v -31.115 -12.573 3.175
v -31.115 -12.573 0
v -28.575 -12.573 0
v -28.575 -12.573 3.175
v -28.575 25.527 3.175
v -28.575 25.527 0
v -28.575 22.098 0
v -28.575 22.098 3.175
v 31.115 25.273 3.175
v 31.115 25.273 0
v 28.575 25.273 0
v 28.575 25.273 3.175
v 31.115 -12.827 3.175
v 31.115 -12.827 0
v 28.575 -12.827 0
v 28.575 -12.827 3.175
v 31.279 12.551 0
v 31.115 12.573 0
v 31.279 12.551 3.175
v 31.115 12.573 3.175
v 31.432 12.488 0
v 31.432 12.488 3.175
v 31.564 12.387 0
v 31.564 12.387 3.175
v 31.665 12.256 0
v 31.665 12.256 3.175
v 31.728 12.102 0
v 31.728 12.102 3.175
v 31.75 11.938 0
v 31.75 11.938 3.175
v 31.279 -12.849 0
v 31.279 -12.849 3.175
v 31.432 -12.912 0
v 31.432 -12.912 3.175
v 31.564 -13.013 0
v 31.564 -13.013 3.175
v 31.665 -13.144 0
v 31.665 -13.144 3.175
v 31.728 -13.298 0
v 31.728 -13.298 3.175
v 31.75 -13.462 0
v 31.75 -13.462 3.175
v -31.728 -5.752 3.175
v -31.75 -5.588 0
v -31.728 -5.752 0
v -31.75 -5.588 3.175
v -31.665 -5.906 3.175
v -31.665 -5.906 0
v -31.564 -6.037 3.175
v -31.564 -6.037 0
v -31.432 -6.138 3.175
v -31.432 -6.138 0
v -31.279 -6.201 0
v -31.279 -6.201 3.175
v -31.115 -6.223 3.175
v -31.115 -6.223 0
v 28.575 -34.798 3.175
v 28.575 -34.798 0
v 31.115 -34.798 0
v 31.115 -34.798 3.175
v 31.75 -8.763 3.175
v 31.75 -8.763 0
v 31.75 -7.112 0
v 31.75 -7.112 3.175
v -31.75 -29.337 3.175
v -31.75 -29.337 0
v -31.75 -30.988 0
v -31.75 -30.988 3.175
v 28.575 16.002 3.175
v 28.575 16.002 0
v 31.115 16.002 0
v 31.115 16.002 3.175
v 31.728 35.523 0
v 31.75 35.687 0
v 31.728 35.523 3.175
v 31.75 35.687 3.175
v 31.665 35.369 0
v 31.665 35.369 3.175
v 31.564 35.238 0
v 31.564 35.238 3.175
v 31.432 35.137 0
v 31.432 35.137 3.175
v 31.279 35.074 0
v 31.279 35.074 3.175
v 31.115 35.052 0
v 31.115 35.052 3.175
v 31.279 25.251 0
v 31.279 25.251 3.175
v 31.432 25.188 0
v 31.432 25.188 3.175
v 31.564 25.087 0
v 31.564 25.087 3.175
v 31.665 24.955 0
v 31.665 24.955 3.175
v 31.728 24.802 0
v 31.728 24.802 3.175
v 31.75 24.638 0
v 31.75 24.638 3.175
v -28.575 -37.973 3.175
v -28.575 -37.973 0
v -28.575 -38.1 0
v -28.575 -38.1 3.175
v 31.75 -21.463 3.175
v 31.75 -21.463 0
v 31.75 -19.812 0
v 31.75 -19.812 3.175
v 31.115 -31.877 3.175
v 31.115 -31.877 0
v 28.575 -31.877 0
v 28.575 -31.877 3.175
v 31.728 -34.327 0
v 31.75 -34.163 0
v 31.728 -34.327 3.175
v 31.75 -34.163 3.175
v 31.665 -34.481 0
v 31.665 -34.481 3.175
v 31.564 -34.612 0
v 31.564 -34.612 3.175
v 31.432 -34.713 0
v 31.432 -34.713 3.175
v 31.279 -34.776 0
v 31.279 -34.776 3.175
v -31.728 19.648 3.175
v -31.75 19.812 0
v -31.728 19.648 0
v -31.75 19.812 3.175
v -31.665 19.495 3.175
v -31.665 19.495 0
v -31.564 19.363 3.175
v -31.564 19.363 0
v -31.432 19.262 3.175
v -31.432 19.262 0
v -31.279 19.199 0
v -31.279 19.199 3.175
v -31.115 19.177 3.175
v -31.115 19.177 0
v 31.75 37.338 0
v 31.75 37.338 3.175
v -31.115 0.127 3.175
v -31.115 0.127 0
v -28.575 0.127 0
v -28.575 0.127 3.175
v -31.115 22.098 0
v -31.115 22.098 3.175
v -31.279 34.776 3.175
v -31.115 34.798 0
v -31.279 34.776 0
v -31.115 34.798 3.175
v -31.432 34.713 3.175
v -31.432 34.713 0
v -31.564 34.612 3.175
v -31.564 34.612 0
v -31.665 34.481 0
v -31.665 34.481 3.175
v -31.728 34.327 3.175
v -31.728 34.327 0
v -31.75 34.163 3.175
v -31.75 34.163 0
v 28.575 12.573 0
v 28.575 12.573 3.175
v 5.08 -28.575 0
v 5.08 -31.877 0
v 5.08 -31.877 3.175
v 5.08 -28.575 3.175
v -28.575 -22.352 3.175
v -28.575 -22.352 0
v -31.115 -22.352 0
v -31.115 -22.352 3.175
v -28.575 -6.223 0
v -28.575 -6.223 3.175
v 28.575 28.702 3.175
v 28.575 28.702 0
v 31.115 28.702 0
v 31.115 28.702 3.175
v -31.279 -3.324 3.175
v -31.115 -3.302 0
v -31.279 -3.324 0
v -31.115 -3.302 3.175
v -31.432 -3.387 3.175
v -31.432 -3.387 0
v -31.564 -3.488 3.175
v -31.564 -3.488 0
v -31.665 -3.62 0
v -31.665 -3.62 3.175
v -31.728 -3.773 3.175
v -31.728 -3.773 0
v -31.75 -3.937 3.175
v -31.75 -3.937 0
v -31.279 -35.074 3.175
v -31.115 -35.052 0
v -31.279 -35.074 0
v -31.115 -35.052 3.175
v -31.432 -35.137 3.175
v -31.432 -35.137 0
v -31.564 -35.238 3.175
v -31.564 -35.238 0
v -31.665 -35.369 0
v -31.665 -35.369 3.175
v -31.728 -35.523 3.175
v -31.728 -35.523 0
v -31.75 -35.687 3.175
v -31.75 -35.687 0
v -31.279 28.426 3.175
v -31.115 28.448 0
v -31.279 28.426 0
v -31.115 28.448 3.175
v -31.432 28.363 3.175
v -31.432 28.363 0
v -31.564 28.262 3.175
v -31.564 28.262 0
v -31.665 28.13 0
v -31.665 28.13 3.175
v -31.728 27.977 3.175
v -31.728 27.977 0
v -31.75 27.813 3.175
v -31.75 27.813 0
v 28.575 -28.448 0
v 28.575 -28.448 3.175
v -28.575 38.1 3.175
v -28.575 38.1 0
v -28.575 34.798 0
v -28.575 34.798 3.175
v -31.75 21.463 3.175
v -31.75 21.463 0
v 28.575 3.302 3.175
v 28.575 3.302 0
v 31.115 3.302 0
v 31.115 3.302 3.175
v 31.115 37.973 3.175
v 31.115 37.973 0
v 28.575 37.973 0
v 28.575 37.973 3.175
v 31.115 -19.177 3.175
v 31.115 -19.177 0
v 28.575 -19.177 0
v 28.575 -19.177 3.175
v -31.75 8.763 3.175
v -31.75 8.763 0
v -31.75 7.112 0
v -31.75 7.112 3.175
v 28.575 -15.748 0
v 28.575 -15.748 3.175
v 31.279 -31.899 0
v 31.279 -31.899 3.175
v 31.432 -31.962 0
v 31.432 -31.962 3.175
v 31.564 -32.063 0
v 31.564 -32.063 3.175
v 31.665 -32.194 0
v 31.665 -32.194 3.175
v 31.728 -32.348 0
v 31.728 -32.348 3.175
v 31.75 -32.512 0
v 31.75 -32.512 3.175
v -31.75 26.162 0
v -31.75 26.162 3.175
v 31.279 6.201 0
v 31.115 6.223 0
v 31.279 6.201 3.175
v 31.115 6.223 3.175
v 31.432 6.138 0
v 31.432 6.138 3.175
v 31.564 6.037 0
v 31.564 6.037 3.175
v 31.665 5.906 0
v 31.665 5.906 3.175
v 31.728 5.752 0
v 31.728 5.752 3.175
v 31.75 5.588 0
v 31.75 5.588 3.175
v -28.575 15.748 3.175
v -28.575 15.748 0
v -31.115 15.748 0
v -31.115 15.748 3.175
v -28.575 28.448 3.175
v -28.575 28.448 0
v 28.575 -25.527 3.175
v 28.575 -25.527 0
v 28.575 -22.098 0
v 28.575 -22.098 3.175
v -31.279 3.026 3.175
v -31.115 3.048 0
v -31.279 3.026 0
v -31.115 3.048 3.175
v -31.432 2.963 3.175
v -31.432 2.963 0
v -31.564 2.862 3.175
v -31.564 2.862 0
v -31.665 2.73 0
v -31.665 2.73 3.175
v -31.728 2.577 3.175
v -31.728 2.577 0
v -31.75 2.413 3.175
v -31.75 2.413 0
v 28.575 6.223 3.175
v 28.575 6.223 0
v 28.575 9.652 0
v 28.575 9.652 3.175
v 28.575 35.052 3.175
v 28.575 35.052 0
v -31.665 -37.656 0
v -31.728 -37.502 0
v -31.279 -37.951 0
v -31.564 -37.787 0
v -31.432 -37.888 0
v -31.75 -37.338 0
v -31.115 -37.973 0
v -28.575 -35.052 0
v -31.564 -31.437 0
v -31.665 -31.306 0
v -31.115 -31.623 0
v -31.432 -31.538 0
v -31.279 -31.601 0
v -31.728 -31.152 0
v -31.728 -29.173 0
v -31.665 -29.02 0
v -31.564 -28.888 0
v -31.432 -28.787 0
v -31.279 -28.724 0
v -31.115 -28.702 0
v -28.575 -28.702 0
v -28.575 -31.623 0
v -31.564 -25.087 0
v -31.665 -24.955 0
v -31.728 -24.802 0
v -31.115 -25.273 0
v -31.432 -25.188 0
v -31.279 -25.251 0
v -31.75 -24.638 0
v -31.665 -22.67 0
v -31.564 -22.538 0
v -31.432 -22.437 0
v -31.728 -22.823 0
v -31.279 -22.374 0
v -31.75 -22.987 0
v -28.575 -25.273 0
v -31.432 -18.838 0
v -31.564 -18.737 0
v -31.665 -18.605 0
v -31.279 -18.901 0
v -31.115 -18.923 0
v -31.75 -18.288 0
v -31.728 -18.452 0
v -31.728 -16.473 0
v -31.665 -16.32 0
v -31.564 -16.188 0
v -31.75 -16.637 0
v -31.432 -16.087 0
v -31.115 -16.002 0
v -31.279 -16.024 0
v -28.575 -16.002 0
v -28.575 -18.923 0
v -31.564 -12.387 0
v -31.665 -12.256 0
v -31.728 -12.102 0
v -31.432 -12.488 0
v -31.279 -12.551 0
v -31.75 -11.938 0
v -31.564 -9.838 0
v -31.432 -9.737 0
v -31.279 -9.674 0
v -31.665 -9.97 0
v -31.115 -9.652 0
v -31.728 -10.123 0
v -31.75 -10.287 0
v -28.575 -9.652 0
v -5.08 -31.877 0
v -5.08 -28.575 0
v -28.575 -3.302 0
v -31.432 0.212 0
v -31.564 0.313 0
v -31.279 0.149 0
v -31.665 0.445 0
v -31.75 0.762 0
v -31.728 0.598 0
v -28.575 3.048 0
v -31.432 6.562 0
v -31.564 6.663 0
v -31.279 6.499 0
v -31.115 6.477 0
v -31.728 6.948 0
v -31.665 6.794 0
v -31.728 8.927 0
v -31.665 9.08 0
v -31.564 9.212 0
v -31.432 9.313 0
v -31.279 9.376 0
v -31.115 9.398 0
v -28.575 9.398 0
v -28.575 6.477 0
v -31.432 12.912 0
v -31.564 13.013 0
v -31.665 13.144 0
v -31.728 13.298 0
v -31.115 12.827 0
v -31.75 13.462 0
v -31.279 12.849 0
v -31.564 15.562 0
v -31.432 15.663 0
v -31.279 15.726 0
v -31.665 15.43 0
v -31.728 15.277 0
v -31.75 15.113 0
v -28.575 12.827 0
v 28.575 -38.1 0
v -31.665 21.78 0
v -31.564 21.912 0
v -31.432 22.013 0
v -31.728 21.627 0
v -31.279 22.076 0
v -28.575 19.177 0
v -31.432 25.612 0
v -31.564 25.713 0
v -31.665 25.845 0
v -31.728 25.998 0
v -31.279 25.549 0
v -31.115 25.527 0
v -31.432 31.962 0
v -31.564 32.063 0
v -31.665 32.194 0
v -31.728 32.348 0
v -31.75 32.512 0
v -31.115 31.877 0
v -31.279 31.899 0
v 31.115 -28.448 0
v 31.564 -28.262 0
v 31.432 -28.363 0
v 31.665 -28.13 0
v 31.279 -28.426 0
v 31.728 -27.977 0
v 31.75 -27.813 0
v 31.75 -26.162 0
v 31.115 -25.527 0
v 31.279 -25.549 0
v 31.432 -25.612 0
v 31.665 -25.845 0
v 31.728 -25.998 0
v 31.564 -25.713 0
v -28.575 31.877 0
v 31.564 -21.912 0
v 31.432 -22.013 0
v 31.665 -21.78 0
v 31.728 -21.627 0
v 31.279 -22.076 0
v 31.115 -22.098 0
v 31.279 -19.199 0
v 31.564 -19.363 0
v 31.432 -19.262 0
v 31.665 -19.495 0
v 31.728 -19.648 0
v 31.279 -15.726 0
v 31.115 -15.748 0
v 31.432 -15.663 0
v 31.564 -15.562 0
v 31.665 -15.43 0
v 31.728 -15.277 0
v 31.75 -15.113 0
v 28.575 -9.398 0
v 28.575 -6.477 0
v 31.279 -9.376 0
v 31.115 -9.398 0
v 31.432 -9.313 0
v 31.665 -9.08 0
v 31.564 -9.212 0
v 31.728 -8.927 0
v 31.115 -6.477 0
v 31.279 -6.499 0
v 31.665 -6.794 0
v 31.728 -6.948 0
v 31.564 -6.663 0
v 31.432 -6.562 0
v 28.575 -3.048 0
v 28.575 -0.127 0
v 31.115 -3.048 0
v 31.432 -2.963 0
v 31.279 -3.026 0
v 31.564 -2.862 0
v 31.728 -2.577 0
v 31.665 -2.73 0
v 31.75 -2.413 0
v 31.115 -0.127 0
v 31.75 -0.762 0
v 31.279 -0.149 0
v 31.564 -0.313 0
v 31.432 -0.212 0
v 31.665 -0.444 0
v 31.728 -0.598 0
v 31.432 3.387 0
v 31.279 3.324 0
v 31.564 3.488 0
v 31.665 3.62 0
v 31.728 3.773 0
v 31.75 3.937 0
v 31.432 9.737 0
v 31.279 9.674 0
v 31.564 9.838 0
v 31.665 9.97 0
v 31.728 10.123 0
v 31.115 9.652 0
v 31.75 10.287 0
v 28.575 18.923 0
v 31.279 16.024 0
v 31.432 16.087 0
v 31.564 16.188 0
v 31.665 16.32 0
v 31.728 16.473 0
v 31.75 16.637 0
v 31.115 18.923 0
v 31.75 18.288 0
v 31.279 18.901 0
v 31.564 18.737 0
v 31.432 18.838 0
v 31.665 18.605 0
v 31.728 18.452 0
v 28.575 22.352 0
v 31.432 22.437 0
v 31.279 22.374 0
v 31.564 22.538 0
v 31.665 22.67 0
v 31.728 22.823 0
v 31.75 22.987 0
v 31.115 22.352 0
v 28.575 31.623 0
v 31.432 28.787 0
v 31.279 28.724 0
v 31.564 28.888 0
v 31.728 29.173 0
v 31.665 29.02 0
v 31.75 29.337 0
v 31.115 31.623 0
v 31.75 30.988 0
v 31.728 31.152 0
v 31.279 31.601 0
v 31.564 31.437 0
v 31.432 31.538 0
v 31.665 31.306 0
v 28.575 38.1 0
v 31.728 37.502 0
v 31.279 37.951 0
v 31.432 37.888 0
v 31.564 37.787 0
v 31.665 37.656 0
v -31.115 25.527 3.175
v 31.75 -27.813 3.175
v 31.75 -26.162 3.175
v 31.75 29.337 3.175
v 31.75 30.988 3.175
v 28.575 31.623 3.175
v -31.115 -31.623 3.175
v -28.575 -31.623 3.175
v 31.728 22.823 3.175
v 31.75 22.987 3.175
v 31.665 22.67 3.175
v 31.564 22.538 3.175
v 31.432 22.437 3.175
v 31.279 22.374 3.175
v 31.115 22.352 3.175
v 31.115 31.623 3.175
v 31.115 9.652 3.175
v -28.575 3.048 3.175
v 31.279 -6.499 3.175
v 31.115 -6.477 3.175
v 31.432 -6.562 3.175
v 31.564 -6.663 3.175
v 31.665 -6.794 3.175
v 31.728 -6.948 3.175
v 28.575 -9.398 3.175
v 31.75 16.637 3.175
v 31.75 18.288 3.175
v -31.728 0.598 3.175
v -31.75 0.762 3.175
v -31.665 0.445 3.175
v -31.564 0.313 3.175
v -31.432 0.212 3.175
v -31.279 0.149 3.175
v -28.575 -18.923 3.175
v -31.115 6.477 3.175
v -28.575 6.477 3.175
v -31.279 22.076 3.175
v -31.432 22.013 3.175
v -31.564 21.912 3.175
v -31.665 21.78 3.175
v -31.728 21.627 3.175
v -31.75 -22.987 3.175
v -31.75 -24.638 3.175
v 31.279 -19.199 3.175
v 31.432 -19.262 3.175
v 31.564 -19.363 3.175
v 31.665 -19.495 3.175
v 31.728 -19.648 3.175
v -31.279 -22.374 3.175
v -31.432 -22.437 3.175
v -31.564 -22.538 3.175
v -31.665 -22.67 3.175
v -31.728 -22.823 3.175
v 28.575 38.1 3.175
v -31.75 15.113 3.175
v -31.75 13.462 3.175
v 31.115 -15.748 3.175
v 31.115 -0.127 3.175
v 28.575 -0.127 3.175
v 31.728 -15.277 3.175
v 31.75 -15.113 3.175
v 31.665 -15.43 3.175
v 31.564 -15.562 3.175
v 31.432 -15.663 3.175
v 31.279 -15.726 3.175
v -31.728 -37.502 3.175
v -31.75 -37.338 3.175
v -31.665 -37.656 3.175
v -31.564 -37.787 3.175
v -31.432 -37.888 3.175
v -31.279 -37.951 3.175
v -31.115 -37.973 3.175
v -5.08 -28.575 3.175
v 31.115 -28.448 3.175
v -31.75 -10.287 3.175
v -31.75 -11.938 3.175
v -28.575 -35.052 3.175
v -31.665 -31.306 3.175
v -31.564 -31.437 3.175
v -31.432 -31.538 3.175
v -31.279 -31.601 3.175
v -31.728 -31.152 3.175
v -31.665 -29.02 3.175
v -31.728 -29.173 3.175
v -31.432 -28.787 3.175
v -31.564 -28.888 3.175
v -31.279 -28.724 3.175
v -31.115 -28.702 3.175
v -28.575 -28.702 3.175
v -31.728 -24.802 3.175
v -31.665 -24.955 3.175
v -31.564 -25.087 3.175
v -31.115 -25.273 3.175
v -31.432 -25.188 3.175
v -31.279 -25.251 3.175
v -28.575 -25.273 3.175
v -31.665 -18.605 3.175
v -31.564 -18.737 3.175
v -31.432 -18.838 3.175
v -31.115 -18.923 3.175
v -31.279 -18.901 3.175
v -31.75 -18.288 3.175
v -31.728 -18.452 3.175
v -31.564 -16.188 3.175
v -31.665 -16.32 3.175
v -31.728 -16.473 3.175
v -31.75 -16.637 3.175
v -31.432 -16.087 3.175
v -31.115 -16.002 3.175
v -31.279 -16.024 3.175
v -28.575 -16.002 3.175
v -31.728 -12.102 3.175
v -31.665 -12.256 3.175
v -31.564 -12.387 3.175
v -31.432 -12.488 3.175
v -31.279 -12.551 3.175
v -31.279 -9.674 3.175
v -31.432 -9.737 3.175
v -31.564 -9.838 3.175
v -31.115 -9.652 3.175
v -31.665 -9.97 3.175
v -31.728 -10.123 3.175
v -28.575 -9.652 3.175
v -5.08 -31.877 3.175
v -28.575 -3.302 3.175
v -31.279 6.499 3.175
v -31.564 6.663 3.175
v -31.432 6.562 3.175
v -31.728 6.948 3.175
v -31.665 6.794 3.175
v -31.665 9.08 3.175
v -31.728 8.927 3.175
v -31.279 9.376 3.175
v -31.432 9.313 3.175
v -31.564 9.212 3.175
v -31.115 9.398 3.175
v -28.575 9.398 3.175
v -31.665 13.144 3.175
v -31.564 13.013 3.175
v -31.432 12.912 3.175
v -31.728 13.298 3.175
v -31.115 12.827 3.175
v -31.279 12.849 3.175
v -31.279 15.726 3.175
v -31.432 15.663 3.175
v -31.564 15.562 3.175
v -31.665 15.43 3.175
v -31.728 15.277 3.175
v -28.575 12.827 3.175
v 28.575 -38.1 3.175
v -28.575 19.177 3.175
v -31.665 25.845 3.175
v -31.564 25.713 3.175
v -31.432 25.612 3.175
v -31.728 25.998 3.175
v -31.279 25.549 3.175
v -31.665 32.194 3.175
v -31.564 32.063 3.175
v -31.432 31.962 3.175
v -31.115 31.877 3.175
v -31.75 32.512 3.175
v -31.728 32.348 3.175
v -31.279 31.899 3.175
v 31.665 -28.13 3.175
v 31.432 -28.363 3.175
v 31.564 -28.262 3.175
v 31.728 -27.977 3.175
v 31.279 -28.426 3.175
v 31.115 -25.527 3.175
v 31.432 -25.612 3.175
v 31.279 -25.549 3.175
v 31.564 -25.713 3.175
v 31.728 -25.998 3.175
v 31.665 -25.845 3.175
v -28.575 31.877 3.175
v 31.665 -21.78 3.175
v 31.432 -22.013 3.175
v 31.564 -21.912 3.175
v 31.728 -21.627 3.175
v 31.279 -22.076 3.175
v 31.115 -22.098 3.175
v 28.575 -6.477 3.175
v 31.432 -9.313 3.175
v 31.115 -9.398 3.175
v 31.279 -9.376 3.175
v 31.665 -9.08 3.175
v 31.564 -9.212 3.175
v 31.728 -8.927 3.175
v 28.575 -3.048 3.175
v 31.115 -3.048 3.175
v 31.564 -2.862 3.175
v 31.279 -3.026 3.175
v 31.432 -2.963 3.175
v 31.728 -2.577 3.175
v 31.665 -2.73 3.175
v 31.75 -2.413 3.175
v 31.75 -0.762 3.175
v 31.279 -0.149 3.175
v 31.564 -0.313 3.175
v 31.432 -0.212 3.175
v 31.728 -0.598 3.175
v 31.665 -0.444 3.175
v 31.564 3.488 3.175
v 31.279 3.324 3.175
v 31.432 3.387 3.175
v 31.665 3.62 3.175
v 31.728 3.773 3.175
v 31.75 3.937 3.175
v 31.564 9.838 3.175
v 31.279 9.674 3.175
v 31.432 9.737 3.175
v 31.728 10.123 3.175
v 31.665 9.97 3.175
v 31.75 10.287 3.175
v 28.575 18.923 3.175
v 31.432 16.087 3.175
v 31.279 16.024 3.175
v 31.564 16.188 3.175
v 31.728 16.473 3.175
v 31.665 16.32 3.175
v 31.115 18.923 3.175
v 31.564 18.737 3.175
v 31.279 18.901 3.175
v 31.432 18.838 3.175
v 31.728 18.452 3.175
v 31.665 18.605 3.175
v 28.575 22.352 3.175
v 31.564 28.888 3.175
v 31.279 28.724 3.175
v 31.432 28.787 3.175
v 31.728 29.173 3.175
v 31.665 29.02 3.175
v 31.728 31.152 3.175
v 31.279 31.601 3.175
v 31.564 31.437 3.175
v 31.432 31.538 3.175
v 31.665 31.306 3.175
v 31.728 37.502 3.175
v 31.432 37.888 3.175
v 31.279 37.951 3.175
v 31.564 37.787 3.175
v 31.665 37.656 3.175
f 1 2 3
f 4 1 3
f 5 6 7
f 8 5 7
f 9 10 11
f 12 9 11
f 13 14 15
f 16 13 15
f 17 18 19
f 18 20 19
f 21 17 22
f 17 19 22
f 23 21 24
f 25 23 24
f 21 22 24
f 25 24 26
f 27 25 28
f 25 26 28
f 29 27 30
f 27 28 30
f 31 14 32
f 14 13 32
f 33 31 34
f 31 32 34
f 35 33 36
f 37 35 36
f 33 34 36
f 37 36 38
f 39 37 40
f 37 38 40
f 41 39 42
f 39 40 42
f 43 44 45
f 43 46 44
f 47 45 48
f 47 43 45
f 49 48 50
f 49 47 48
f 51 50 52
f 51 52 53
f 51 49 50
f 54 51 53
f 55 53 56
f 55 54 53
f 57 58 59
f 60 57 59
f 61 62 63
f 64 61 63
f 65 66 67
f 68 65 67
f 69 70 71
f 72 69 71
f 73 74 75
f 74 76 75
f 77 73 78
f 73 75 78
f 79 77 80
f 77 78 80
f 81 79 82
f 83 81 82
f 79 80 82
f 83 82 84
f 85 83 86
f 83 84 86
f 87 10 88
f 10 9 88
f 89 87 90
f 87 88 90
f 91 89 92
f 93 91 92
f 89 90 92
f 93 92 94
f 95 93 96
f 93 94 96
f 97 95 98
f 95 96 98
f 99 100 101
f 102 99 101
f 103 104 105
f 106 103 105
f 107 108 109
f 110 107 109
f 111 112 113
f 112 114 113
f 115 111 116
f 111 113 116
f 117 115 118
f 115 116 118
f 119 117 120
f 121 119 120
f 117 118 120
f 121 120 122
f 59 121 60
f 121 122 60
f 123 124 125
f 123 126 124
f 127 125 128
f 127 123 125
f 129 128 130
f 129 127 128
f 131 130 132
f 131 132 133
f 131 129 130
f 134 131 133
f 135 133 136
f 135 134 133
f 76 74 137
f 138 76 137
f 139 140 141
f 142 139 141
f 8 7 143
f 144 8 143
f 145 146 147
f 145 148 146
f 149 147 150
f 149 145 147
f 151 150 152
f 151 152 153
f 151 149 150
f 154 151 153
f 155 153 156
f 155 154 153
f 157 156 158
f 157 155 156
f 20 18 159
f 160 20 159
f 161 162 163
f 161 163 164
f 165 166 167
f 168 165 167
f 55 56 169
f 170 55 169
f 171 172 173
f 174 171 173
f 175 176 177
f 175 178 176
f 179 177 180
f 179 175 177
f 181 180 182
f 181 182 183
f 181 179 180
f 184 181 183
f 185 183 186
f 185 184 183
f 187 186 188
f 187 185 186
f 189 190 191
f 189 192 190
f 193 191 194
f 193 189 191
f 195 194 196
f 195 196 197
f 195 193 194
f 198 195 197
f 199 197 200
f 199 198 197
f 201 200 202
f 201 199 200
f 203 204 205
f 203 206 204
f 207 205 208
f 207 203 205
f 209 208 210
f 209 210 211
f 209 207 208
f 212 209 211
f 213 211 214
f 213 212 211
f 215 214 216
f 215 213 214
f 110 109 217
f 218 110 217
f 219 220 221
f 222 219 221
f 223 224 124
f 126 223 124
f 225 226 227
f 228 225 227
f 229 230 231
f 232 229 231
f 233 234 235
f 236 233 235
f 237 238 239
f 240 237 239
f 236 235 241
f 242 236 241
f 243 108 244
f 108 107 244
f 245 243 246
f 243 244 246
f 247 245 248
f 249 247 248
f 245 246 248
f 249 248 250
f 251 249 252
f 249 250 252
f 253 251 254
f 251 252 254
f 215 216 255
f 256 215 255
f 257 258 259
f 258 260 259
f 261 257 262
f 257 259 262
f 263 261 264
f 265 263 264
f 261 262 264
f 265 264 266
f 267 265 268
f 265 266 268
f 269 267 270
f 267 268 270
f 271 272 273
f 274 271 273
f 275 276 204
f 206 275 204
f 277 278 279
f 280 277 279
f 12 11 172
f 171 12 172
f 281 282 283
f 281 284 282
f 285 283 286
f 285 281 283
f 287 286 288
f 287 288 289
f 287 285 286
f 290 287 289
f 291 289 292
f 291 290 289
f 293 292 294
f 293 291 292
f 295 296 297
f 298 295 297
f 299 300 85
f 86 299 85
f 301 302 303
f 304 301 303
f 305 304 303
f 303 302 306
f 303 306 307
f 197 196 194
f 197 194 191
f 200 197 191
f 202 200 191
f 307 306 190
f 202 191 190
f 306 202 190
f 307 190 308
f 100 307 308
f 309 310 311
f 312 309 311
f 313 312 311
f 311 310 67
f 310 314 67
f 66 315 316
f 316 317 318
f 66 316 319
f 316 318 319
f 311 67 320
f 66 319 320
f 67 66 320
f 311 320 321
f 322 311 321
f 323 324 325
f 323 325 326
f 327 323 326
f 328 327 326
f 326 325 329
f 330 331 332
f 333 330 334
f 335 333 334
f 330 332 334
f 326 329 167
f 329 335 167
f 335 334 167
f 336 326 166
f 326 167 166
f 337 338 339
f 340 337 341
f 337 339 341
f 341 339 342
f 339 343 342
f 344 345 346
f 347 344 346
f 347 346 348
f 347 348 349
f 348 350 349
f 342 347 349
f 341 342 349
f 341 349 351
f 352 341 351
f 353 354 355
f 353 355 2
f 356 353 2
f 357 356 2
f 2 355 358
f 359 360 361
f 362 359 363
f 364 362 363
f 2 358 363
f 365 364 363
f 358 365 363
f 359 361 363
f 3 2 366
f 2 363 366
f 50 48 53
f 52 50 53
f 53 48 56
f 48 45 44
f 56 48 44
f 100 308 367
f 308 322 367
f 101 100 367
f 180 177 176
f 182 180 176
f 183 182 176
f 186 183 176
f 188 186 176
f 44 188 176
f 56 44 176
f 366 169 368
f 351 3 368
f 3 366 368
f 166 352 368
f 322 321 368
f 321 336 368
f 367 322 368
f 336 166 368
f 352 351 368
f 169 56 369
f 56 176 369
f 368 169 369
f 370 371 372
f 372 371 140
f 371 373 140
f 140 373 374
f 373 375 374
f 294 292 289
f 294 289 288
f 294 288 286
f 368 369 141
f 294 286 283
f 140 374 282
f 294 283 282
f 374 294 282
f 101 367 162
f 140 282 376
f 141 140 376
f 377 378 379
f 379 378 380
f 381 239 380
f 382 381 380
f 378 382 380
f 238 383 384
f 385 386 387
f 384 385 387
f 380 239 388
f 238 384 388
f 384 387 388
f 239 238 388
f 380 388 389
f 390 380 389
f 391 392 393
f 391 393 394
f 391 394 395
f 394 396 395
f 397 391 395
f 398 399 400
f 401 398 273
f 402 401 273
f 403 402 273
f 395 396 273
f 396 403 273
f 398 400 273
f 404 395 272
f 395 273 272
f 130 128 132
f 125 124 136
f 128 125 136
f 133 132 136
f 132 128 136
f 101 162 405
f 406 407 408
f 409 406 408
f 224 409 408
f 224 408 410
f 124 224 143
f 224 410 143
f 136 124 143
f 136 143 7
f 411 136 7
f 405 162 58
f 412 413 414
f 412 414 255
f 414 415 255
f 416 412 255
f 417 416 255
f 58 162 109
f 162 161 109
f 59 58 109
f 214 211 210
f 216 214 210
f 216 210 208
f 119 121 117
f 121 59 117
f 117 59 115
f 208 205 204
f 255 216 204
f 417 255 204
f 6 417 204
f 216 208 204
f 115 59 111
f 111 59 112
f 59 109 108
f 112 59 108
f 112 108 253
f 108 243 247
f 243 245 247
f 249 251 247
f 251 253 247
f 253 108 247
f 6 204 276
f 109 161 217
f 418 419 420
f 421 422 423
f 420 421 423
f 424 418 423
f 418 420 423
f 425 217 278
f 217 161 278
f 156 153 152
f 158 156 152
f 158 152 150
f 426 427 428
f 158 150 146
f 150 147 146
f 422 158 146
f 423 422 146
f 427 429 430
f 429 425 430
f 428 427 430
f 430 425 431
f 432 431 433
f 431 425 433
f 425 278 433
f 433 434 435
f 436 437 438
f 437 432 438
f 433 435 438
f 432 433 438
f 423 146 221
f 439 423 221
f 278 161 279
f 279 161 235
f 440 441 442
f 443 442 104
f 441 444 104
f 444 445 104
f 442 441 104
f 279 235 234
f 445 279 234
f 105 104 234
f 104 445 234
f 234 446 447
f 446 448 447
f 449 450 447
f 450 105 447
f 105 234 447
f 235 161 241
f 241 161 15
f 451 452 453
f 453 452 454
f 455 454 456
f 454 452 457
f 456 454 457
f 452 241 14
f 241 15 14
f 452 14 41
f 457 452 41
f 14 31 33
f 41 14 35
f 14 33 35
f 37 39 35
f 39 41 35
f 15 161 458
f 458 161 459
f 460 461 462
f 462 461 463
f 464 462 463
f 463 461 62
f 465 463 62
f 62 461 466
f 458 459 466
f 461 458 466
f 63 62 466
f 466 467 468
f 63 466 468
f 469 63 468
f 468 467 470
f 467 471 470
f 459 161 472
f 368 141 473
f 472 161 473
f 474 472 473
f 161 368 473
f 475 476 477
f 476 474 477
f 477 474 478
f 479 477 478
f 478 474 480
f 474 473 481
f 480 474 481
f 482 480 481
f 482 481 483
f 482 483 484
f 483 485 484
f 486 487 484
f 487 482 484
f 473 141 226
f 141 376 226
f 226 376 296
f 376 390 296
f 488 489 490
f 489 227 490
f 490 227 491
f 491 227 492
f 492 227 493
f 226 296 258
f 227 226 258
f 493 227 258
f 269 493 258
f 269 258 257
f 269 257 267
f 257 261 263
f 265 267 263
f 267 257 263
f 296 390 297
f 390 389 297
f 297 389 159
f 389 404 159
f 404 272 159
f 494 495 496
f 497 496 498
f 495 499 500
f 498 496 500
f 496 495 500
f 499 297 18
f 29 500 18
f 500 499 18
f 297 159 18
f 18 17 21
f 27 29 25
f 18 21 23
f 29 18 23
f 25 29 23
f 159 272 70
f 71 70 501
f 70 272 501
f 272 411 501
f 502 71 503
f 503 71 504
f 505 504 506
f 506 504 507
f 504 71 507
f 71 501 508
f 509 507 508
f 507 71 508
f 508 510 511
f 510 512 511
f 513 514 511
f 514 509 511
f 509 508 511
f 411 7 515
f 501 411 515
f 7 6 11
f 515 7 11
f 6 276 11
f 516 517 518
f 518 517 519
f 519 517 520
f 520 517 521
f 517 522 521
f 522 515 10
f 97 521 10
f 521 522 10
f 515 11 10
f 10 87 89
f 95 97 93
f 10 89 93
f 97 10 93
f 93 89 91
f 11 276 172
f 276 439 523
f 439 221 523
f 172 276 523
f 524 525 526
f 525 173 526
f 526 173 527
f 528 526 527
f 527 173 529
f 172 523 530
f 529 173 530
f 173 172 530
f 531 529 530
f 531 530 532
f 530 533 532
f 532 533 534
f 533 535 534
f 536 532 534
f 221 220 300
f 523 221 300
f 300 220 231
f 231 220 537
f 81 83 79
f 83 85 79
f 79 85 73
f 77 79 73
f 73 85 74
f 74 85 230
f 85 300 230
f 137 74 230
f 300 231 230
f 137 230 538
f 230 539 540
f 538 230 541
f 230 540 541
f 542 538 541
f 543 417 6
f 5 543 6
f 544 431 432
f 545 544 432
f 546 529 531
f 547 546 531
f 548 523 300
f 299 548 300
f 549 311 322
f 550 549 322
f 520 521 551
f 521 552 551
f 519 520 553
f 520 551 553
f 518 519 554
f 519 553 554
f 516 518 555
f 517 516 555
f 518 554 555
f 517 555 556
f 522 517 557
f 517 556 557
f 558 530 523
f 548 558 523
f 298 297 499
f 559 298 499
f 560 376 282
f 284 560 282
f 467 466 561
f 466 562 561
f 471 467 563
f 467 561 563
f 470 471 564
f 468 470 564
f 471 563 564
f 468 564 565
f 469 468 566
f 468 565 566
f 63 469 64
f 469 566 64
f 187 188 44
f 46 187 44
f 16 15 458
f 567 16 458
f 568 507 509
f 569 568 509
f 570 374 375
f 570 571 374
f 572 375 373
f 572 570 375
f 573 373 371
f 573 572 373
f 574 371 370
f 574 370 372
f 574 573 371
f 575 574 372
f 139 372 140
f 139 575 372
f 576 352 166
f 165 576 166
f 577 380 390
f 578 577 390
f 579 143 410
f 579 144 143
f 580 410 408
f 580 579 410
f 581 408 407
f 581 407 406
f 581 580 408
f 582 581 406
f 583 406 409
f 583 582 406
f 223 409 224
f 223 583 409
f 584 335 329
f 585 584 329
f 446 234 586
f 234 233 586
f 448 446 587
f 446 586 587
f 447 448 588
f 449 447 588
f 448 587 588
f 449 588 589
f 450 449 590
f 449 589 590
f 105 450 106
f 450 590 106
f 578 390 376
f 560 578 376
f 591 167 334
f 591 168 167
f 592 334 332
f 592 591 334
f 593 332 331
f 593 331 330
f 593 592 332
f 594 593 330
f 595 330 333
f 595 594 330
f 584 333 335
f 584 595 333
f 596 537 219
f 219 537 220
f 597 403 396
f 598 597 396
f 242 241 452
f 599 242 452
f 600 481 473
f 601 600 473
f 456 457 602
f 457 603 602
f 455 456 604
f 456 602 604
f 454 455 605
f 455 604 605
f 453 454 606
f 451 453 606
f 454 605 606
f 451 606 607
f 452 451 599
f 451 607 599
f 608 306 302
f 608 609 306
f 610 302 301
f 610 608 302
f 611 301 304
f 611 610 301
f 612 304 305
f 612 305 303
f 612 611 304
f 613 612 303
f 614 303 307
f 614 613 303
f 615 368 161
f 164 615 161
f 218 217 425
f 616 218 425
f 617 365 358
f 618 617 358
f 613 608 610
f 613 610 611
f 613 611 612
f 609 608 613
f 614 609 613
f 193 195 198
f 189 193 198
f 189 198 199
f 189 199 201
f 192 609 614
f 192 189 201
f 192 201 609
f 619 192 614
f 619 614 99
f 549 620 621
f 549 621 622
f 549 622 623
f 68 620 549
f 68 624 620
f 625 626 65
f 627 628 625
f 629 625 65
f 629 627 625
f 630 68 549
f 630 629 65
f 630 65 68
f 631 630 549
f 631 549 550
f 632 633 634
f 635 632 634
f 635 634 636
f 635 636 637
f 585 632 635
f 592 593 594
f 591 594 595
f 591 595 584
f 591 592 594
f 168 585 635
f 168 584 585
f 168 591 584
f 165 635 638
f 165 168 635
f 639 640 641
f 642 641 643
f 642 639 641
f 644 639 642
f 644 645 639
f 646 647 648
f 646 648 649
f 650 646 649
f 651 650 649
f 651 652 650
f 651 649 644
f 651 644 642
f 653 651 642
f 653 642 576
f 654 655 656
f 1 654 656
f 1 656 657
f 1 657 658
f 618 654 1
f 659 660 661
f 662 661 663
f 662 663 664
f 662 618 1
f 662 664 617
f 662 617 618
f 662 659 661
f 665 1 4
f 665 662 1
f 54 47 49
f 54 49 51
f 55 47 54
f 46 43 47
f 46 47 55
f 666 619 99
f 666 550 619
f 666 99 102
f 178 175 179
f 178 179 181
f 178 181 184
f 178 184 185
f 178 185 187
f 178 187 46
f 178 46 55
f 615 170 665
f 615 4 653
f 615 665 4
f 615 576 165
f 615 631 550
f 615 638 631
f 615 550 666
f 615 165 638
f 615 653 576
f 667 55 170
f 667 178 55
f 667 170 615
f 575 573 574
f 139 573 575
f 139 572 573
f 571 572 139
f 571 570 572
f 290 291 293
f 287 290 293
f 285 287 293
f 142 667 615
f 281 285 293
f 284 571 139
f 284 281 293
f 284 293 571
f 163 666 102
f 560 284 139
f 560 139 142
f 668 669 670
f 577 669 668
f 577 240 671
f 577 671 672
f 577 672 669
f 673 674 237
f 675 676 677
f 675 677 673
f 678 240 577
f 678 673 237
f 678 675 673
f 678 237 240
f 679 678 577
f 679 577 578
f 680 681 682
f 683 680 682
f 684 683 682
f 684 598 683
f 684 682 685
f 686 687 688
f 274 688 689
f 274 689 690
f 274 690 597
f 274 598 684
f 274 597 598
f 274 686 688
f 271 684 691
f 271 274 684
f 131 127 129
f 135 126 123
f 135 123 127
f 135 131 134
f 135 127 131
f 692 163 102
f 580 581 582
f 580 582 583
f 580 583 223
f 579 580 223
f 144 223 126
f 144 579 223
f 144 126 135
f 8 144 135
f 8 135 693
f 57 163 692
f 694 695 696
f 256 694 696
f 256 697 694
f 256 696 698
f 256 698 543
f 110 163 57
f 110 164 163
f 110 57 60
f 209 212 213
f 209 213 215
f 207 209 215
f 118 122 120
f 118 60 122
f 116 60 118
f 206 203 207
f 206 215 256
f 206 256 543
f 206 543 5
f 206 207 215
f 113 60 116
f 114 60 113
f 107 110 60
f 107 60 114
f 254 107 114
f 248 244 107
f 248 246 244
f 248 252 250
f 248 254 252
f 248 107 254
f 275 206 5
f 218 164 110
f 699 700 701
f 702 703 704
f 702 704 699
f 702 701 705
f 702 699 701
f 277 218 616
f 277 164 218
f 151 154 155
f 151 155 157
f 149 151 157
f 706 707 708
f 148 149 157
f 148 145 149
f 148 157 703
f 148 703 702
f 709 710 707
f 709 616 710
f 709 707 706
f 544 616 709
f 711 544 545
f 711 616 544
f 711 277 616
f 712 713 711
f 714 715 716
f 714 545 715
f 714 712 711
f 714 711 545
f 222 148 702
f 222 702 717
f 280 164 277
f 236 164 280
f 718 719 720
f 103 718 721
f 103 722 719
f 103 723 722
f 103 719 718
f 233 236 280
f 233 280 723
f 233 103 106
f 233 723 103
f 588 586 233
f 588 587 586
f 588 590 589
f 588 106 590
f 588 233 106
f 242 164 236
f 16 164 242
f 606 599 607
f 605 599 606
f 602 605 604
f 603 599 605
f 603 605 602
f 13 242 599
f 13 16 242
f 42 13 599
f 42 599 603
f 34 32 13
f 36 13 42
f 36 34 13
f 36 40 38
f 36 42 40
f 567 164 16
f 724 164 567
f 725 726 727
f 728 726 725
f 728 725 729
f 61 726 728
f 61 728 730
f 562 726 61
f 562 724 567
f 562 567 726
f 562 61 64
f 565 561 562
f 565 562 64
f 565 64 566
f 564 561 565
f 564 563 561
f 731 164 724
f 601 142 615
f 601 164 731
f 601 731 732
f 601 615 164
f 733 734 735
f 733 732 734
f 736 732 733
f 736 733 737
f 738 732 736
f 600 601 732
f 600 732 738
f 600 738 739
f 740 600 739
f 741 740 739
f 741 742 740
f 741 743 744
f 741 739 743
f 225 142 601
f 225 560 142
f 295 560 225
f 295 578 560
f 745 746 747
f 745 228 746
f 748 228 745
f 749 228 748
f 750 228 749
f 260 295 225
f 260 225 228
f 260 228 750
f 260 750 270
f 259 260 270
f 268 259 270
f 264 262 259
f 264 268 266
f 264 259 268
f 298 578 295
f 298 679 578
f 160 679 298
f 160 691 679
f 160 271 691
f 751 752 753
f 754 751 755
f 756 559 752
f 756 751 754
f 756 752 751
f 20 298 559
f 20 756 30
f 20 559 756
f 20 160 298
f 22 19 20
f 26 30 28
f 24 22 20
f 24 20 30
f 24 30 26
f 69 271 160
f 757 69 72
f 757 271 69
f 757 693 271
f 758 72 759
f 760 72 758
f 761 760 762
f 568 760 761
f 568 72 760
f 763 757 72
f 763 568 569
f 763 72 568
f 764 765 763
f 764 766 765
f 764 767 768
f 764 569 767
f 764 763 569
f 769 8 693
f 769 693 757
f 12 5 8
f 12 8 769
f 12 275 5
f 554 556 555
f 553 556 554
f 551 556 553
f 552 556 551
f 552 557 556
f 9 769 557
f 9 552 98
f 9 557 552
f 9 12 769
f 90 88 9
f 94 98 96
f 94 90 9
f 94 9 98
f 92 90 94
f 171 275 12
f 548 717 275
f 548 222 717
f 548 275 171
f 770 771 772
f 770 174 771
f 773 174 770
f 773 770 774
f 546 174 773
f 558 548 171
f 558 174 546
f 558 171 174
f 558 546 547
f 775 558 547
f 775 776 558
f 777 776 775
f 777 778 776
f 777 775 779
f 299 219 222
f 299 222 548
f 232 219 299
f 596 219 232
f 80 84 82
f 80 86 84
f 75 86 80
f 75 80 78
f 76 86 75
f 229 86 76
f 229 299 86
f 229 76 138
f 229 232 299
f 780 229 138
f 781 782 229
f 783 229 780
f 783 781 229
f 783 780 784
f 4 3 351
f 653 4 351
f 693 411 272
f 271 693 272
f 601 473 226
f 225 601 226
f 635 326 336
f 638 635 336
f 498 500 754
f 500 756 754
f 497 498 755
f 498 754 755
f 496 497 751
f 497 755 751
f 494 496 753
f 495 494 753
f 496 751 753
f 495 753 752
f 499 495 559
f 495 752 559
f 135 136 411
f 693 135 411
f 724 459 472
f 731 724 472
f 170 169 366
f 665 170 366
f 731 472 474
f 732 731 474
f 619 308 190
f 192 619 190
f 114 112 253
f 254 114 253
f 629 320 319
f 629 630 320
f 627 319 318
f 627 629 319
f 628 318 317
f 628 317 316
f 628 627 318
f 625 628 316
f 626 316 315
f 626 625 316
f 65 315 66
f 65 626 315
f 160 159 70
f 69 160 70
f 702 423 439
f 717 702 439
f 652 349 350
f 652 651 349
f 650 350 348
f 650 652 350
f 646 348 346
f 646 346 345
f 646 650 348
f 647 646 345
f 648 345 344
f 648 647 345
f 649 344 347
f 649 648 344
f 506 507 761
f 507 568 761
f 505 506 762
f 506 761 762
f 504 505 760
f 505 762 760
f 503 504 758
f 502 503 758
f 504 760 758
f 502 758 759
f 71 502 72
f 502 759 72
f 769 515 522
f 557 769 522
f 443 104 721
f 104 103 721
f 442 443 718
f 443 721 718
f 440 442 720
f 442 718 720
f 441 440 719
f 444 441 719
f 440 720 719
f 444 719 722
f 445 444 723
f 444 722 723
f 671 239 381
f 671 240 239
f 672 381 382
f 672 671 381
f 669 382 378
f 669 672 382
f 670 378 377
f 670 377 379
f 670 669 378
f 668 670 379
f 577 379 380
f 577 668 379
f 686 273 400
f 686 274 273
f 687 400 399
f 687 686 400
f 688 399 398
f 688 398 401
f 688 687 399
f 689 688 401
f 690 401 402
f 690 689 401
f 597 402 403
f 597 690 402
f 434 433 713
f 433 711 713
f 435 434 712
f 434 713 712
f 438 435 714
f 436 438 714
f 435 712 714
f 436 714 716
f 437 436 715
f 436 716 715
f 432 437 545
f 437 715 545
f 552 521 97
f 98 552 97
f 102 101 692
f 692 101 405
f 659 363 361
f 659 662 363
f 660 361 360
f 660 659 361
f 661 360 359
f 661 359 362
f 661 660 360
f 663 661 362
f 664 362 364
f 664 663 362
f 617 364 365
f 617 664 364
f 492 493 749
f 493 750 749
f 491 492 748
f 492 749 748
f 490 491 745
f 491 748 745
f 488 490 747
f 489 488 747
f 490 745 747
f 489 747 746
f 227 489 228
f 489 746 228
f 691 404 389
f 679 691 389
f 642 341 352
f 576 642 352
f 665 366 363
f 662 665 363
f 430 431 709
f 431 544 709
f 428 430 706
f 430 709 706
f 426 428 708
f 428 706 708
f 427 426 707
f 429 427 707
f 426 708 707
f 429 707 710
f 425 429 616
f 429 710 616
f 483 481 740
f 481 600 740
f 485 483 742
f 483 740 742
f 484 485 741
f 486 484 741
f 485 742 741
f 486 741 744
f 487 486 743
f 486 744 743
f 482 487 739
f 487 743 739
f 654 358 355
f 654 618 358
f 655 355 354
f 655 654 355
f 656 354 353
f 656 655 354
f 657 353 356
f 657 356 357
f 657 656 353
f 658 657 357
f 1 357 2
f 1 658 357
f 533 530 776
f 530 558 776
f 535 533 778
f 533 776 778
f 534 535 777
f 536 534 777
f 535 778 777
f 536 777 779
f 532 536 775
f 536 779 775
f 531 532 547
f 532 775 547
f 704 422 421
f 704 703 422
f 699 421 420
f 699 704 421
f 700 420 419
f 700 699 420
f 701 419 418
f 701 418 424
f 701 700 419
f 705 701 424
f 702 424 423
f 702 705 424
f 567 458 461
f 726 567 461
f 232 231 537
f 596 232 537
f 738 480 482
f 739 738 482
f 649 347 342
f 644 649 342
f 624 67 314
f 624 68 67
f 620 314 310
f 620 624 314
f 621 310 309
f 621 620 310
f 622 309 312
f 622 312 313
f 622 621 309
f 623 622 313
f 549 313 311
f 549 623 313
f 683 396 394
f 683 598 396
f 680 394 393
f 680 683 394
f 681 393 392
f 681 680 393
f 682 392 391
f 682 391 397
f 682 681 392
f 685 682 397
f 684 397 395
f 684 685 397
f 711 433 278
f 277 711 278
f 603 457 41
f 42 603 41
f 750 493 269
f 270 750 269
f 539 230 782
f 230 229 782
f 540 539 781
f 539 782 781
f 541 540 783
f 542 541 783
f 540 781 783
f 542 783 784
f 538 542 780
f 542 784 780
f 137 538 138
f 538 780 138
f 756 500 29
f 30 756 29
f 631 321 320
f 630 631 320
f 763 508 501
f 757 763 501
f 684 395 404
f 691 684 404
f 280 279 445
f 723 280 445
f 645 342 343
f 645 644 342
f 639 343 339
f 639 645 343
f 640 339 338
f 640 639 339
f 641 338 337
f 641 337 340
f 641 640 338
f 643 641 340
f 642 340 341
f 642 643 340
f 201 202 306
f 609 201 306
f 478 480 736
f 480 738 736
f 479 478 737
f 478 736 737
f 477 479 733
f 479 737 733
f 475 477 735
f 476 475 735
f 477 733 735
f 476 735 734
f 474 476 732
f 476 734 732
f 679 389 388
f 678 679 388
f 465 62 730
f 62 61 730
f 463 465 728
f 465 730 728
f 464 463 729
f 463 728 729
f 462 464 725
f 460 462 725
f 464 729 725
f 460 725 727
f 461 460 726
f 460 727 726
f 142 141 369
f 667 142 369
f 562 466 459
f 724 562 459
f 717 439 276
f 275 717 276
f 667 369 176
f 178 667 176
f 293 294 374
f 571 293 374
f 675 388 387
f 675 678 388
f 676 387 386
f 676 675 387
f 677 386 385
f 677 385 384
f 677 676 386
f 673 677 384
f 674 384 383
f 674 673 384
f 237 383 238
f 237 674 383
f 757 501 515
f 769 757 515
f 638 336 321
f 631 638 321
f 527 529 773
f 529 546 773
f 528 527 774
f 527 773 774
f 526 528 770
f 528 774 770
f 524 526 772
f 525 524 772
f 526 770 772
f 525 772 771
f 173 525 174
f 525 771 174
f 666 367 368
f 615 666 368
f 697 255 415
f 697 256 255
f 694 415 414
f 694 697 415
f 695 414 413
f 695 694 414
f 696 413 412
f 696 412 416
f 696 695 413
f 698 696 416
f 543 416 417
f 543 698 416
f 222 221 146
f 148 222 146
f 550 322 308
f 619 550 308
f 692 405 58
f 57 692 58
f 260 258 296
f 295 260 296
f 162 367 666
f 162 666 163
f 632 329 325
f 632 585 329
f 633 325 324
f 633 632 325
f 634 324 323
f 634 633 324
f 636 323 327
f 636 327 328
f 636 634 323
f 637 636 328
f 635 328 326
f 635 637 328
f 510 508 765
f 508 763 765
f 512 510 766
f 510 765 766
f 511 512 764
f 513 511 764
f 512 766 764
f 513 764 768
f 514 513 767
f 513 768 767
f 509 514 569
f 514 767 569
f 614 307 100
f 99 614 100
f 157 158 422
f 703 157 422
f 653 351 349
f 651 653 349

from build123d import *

# Parameters (mm, degrees)
SKETCH1_W           = 10.16
SKETCH1_H           = 3.302
BOSS_EXTRUDE1_DEPTH = 3.175
FILLET2_R           = 0.635


with BuildPart() as part:
    # Sketch1 → Boss-Extrude1 (new body)
    with BuildSketch(Plane.XY):
        Polygon((28.575, 38.1), (-28.575, 38.1), (-28.575, 34.798), (-31.75, 34.798), (-31.75, 31.877), (-28.575, 31.877), (-28.575, 28.448), (-31.75, 28.448), (-31.75, 25.527), (-28.575, 25.527), (-28.575, 22.098), (-31.75, 22.098), (-31.75, 19.177), (-28.575, 19.177), (-28.575, 15.748), (-31.75, 15.748), (-31.75, 12.827), (-28.575, 12.827), (-28.575, 9.398), (-31.75, 9.398), (-31.75, 6.477), (-28.575, 6.477), (-28.575, 3.048), (-31.75, 3.048), (-31.75, 0.127), (-28.575, 0.127), (-28.575, -3.302), (-31.75, -3.302), (-31.75, -6.223), (-28.575, -6.223), (-28.575, -9.652), (-31.75, -9.652), (-31.75, -12.573), (-28.575, -12.573), (-28.575, -16.002), (-31.75, -16.002), (-31.75, -18.923), (-28.575, -18.923), (-28.575, -22.352), (-31.75, -22.352), (-31.75, -25.273), (-28.575, -25.273), (-28.575, -28.702), (-31.75, -28.702), (-31.75, -31.623), (-28.575, -31.623), (-28.575, -35.052), (-31.75, -35.052), (-31.75, -37.973), (-28.575, -37.973), (-28.575, -38.1), (28.575, -38.1), (28.575, -34.798), (31.75, -34.798), (31.75, -31.877), (28.575, -31.877), (28.575, -28.448), (31.75, -28.448), (31.75, -25.527), (28.575, -25.527), (28.575, -22.098), (31.75, -22.098), (31.75, -19.177), (28.575, -19.177), (28.575, -15.748), (31.75, -15.748), (31.75, -12.827), (28.575, -12.827), (28.575, -9.398), (31.75, -9.398), (31.75, -6.477), (28.575, -6.477), (28.575, -3.048), (31.75, -3.048), (31.75, -0.127), (28.575, -0.127), (28.575, 3.302), (31.75, 3.302), (31.75, 6.223), (28.575, 6.223), (28.575, 9.652), (31.75, 9.652), (31.75, 12.573), (28.575, 12.573), (28.575, 16.002), (31.75, 16.002), (31.75, 18.923), (28.575, 18.923), (28.575, 22.352), (31.75, 22.352), (31.75, 25.273), (28.575, 25.273), (28.575, 28.702), (31.75, 28.702), (31.75, 31.623), (28.575, 31.623), (28.575, 35.052), (31.75, 35.052), (31.75, 37.973), (28.575, 37.973), align=None)
        with Locations((0, -30.226)):
            Rectangle(SKETCH1_W, SKETCH1_H, mode=Mode.SUBTRACT)
    extrude(amount=BOSS_EXTRUDE1_DEPTH)

    # Fillet2
    fillet2_edges = [part.edges().sort_by_distance(p)[0] for p in [
        (31.75, 37.973, 1.5875),
        (31.75, 35.052, 1.5875),
        (31.75, 31.623, 1.5875),
        (31.75, 28.702, 1.5875),
        (31.75, 25.273, 1.5875),
        (31.75, 22.352, 1.5875),
        (31.75, 18.923, 1.5875),
        (31.75, 16.002, 1.5875),
        (31.75, 12.573, 1.5875),
        (31.75, 9.652, 1.5875),
        (31.75, 6.223, 1.5875),
        (31.75, 3.302, 1.5875),
        (31.75, -0.127, 1.5875),
        (31.75, -3.048, 1.5875),
        (31.75, -6.477, 1.5875),
        (31.75, -9.398, 1.5875),
        (31.75, -12.827, 1.5875),
        (31.75, -15.748, 1.5875),
        (31.75, -19.177, 1.5875),
        (31.75, -22.098, 1.5875),
        (31.75, -25.527, 1.5875),
        (31.75, -28.448, 1.5875),
        (31.75, -31.877, 1.5875),
        (31.75, -34.798, 1.5875),
        (-31.75, -37.973, 1.5875),
        (-31.75, -35.052, 1.5875),
        (-31.75, -31.623, 1.5875),
        (-31.75, -28.702, 1.5875),
        (-31.75, -25.273, 1.5875),
        (-31.75, -22.352, 1.5875),
        (-31.75, -18.923, 1.5875),
        (-31.75, -16.002, 1.5875),
        (-31.75, -12.573, 1.5875),
        (-31.75, -9.652, 1.5875),
        (-31.75, -6.223, 1.5875),
        (-31.75, -3.302, 1.5875),
        (-31.75, 0.127, 1.5875),
        (-31.75, 3.048, 1.5875),
        (-31.75, 6.477, 1.5875),
        (-31.75, 9.398, 1.5875),
        (-31.75, 12.827, 1.5875),
        (-31.75, 15.748, 1.5875),
        (-31.75, 19.177, 1.5875),
        (-31.75, 22.098, 1.5875),
        (-31.75, 25.527, 1.5875),
        (-31.75, 28.448, 1.5875),
        (-31.75, 31.877, 1.5875),
        (-31.75, 34.798, 1.5875),
    ]]
    fillet(fillet2_edges, radius=FILLET2_R)


solid = part.part
